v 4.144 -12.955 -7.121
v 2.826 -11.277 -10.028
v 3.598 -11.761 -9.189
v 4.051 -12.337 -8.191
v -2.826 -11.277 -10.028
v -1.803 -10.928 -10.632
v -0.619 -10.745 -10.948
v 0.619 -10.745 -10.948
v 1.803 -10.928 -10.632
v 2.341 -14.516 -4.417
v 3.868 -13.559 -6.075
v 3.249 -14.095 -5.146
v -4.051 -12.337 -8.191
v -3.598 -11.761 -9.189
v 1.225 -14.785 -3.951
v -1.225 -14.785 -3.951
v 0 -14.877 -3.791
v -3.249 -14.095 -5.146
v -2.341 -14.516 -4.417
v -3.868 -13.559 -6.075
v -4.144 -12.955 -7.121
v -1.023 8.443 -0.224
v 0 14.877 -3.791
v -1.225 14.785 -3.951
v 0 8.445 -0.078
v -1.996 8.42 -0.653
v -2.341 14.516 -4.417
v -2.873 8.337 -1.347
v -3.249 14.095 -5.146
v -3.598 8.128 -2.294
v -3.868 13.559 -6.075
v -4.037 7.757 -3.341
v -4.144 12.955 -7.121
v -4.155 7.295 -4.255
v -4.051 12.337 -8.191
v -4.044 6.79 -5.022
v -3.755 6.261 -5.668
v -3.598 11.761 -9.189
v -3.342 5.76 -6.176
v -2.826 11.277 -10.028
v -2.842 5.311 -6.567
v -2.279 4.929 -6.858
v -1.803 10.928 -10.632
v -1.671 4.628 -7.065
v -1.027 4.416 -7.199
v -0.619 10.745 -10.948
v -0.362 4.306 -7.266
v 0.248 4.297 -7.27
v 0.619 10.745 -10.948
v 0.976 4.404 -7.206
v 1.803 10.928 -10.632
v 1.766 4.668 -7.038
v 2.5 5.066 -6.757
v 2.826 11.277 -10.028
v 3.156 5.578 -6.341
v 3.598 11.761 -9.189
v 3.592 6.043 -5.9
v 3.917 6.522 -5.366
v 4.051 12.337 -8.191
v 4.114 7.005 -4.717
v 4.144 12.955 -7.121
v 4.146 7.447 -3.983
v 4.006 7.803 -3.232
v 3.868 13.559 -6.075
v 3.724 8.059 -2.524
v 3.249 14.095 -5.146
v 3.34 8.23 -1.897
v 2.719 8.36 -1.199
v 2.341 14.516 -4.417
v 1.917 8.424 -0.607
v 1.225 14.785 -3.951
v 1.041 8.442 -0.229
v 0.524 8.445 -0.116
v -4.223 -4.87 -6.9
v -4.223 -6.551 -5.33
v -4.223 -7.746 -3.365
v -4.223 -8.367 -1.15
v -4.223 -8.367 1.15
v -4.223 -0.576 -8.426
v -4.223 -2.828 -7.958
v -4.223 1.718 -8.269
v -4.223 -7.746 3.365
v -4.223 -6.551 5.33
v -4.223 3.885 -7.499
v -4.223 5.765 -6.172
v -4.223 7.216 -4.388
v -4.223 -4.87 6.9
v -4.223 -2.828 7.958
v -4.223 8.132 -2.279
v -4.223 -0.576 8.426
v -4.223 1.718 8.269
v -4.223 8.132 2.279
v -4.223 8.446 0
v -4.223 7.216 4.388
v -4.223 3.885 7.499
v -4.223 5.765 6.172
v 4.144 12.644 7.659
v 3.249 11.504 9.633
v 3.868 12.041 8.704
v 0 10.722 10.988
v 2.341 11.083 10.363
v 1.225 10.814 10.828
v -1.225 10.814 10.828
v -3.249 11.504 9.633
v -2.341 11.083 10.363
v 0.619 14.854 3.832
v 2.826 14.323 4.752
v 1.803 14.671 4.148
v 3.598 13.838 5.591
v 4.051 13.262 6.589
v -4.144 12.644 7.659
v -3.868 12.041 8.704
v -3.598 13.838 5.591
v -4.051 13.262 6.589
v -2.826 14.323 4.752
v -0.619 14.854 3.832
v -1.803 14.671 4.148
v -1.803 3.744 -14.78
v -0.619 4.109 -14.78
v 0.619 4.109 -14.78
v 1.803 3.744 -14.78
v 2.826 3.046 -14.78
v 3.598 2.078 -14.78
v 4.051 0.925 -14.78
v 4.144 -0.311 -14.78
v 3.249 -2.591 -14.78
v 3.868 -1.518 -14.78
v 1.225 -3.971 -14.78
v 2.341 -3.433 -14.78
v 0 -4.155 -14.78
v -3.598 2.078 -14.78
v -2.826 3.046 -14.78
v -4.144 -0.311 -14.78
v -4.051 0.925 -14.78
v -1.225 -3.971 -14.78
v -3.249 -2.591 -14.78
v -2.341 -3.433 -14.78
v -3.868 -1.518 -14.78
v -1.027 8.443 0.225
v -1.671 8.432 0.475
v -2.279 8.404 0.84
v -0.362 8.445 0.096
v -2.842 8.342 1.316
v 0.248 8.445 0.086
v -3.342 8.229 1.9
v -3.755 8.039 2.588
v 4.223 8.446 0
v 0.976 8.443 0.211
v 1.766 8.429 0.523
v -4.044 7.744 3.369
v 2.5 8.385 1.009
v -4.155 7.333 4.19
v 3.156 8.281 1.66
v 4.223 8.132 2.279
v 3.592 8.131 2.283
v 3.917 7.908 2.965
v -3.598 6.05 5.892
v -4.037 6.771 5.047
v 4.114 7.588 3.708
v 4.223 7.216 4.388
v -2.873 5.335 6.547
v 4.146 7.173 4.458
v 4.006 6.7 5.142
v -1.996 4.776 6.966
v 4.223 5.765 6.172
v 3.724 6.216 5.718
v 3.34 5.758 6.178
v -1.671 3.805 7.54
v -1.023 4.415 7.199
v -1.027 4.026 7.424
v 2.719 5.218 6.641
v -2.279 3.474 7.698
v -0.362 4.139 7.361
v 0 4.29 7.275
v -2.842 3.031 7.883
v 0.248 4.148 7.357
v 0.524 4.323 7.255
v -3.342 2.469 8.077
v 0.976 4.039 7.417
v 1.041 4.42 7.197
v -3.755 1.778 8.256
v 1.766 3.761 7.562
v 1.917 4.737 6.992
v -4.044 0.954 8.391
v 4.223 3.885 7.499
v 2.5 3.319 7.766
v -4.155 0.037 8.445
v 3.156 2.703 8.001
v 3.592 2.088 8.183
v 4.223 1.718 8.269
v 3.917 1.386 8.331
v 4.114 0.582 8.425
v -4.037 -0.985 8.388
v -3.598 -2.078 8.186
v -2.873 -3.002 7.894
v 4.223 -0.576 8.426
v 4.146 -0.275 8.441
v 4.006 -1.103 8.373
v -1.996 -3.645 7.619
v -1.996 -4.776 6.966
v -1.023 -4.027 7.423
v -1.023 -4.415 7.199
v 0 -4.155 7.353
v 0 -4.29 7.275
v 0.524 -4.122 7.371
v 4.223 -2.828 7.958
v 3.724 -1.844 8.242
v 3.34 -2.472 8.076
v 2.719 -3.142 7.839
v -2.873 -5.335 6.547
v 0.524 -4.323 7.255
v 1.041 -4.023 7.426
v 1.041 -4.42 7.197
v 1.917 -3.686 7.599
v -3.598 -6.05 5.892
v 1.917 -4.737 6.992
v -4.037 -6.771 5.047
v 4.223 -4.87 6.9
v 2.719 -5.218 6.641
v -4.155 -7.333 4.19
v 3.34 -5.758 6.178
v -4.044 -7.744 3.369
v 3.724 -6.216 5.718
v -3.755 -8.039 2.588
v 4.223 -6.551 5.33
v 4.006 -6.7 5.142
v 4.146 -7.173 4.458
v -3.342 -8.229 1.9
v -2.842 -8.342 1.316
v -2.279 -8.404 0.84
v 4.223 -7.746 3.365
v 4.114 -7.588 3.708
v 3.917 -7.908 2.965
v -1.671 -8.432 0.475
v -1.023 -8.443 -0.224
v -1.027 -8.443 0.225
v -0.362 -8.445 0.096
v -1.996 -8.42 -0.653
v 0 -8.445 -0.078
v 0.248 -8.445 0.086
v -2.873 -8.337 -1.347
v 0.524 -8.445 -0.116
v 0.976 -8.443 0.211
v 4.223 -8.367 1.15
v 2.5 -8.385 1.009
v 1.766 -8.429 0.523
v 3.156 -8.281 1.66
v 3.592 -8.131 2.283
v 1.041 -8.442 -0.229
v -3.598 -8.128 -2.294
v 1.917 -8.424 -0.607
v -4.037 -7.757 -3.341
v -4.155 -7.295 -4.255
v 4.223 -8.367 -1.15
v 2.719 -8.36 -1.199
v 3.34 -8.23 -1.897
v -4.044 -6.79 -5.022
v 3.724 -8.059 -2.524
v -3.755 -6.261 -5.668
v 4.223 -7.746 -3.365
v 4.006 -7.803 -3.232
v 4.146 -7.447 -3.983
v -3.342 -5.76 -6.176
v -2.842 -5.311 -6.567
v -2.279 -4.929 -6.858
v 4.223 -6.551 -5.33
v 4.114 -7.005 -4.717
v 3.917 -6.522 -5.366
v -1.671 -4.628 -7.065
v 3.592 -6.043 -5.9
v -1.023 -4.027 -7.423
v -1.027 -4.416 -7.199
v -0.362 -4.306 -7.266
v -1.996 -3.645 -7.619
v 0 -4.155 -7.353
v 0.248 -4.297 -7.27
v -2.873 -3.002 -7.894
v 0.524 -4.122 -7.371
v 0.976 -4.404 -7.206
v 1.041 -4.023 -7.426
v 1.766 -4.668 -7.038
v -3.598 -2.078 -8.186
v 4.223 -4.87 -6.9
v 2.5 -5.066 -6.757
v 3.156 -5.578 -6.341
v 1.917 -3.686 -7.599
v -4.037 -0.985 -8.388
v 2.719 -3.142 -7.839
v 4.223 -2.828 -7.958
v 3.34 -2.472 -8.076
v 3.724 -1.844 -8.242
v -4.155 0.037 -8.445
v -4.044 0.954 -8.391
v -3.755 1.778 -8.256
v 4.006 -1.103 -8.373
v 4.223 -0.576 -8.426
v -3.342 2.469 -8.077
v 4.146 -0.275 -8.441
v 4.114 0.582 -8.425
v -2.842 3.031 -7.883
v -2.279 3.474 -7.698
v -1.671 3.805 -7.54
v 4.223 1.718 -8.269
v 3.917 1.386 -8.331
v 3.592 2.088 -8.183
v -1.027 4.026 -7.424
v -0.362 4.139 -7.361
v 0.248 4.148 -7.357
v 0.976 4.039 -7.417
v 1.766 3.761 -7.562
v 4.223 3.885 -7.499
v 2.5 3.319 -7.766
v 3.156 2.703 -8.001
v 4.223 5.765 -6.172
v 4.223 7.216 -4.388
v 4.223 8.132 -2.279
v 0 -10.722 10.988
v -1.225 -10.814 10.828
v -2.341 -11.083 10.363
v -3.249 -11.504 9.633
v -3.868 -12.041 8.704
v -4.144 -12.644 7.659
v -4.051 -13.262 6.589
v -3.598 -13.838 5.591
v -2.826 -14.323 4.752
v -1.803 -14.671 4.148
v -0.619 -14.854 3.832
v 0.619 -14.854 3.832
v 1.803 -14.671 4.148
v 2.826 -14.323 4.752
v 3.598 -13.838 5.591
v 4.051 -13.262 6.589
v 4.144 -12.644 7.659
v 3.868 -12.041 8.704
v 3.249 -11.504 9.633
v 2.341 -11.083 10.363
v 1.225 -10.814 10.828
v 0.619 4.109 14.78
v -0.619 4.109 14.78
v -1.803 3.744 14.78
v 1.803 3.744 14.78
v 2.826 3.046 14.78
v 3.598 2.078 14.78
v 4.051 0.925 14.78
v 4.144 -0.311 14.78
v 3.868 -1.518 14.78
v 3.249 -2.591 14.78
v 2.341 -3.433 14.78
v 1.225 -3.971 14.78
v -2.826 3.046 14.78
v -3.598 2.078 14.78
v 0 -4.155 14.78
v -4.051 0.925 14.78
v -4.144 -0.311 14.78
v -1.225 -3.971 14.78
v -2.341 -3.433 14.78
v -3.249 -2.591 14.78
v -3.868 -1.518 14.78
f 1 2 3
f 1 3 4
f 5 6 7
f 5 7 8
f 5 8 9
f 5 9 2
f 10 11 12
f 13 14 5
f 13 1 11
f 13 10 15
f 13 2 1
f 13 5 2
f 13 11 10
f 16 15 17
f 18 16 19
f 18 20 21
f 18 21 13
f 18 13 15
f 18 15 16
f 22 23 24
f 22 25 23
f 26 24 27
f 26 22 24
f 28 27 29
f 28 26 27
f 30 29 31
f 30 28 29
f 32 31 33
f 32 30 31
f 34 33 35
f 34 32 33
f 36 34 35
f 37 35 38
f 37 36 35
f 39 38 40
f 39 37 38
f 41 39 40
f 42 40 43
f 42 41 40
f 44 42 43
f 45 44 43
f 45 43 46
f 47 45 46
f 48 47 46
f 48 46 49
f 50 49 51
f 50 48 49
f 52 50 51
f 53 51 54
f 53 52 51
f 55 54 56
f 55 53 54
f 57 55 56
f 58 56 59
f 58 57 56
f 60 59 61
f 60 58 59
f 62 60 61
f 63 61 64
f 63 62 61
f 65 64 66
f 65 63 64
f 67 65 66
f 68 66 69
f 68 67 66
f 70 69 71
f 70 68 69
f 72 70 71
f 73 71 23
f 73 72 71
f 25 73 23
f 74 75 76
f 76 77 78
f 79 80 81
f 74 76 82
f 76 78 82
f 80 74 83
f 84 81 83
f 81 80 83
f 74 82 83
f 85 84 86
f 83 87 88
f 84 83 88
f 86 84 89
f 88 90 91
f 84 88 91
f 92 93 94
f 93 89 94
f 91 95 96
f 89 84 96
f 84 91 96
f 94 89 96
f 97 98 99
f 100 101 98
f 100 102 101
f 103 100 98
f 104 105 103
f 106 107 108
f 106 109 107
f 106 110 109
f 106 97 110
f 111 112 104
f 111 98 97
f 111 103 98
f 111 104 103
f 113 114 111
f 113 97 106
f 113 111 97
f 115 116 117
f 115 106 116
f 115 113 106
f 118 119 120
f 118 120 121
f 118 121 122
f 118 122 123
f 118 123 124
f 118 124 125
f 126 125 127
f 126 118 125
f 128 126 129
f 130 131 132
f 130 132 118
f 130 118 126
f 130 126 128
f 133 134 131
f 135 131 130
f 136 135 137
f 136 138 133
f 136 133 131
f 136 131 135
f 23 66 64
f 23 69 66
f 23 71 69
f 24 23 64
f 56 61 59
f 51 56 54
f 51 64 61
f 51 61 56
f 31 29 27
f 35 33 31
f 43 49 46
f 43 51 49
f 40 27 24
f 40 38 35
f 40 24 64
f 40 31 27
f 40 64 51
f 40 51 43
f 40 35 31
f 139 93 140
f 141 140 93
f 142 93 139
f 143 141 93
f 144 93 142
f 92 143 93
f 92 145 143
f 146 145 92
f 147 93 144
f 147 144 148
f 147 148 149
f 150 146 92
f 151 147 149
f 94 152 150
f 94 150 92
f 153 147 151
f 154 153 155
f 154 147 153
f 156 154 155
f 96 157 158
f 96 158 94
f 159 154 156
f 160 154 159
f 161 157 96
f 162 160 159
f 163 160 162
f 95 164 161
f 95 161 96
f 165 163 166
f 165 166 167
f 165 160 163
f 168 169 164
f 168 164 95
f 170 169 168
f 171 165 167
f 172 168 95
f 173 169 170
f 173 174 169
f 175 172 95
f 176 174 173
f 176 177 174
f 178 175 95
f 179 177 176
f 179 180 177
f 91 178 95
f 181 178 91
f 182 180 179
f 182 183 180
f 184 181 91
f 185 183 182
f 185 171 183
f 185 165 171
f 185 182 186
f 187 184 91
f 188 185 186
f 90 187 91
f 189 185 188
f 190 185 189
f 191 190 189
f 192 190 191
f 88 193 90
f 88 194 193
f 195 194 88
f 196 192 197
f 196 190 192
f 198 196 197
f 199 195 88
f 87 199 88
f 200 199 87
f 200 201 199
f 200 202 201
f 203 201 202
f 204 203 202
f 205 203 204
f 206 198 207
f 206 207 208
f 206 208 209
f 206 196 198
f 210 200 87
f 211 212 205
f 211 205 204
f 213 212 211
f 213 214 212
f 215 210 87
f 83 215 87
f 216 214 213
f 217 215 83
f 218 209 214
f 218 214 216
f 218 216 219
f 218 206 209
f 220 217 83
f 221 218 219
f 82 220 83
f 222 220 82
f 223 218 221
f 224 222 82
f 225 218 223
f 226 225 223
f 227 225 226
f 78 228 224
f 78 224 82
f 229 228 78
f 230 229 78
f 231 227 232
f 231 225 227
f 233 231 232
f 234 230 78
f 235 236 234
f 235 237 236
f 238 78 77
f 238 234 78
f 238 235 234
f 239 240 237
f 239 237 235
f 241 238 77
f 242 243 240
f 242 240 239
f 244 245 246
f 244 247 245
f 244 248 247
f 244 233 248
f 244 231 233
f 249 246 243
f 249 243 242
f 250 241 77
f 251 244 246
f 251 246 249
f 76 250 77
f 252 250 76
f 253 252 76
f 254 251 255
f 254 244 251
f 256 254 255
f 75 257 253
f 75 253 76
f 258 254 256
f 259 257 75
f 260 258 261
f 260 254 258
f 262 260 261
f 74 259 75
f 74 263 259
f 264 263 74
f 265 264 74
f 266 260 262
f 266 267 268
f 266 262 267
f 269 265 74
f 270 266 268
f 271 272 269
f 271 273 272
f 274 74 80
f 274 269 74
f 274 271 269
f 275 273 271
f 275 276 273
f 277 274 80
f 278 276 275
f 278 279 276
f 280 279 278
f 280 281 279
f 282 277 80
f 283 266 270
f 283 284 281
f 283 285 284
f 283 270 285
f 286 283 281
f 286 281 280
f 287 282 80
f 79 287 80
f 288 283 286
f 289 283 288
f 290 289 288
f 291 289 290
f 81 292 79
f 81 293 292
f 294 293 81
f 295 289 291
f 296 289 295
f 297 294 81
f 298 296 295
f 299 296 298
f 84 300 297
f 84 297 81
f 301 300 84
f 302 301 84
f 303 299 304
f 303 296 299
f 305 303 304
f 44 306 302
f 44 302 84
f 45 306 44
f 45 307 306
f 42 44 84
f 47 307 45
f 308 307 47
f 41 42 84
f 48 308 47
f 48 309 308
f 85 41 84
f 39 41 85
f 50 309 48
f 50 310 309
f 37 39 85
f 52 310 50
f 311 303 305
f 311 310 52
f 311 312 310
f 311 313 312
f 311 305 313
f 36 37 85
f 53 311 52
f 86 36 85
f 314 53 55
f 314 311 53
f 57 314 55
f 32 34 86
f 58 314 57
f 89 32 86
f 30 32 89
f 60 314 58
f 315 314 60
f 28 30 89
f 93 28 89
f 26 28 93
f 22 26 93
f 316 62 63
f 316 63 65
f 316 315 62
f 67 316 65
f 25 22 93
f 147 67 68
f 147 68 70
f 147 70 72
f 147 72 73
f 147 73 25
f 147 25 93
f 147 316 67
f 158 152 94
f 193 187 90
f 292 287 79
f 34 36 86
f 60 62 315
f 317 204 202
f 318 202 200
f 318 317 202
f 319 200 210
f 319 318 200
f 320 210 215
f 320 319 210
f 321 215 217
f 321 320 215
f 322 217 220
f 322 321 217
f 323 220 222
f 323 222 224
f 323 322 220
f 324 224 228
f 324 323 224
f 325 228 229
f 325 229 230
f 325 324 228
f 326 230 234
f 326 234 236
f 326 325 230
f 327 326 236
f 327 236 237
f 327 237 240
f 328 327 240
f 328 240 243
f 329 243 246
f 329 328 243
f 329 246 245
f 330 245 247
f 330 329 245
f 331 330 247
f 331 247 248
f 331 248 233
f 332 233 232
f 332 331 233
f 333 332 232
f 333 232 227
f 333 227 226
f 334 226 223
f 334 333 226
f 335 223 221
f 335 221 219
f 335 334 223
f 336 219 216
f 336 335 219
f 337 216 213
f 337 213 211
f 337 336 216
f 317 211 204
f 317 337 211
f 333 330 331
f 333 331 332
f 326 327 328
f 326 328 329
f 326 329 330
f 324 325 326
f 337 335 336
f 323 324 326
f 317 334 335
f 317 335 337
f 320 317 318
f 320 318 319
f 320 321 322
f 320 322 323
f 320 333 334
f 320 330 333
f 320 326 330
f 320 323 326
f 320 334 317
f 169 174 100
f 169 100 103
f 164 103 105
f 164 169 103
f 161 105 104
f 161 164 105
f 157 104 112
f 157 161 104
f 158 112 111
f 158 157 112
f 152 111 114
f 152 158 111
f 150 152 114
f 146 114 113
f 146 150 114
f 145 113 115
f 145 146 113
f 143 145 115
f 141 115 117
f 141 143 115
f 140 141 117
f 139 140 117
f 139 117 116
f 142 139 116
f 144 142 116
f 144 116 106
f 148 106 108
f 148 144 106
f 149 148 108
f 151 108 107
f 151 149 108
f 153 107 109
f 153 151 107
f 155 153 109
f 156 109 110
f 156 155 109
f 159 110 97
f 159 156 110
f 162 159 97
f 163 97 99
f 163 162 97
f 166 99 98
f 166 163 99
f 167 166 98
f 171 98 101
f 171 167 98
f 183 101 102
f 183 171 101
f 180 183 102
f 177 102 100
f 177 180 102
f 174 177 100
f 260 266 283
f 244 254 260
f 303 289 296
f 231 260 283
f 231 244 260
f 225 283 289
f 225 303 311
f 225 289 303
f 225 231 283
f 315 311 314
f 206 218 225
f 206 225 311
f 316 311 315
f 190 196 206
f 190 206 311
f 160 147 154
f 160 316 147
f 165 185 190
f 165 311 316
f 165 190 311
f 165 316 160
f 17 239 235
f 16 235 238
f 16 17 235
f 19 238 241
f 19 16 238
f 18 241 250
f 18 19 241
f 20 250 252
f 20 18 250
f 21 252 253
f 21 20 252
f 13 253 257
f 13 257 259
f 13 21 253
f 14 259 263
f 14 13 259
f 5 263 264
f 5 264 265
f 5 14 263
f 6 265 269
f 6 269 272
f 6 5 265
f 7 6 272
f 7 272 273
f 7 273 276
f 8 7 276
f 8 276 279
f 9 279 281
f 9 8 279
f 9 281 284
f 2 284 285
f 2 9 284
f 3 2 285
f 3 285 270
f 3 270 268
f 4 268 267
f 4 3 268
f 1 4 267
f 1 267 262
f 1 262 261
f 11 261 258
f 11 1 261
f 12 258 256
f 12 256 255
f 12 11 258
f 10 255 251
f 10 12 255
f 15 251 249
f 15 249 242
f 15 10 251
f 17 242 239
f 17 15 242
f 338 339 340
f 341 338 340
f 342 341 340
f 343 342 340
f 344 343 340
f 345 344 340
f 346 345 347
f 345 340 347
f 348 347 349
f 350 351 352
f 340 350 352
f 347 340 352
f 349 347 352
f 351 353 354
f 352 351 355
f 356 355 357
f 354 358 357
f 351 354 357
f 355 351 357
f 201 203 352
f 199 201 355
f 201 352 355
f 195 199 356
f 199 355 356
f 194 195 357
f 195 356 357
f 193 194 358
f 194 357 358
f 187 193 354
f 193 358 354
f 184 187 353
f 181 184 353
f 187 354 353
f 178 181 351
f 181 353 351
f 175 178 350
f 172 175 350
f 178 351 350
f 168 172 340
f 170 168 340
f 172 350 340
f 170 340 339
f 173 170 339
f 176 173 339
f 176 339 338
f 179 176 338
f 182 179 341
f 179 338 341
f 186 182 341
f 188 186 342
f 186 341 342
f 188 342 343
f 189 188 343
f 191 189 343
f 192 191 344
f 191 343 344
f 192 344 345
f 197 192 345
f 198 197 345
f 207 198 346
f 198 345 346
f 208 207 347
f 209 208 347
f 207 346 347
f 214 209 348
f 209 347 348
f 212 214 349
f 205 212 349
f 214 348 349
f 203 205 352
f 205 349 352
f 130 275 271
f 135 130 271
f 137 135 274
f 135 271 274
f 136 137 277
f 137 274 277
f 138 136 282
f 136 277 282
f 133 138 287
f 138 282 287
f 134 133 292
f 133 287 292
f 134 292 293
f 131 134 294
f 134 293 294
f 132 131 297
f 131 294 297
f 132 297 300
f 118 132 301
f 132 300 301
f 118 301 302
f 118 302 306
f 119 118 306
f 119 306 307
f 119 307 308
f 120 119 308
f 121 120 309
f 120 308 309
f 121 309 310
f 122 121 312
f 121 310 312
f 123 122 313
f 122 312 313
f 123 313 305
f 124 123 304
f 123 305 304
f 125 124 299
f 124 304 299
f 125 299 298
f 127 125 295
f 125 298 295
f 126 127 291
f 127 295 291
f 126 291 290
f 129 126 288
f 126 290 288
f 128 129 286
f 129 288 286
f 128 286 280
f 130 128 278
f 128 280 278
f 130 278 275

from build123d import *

# Parameters (mm, degrees)
F0_W     = 4.155186
F0_H     = 29.55925
F6_R     = 8.4455
F7_DEPTH = 4.22275


with BuildPart() as f3:
    # F0 (on Right) → F3 (revolve)
    with BuildSketch(Plane.YZ):
        with Locations((-2.077593, 0)):
            Rectangle(F0_W, F0_H)
    revolve(axis=Axis((0, 0, 0), (0, 0, -1)))

    # F1 (on Right) → F4 (revolve)
    with BuildSketch(Plane.YZ):
        Polygon((-12.7995307084, -7.3898125), (12.7995307084, 7.3898125), (10.7219377084, 10.9883091334), (-14.8771237084, -3.7913158666), align=None)
    revolve(axis=Axis((0, 0, 0), (0, -0.8660254038, -0.5)))

    # F2 (on Right) → F5 (revolve)
    with BuildSketch(Plane.YZ):
        Polygon((-12.7995307084, 7.3898125), (12.7995307084, -7.3898125), (14.8771237084, -3.7913158666), (-10.7219377084, 10.9883091334), align=None)
    revolve(axis=Axis((0, 0, 0), (0, -0.8660254038, 0.5)))

    # F6 (on Right) → F7 (join, symmetric)
    with BuildSketch(Plane.YZ):
        Circle(F6_R)
    extrude(amount=F7_DEPTH, both=True)


solid = f3.part
